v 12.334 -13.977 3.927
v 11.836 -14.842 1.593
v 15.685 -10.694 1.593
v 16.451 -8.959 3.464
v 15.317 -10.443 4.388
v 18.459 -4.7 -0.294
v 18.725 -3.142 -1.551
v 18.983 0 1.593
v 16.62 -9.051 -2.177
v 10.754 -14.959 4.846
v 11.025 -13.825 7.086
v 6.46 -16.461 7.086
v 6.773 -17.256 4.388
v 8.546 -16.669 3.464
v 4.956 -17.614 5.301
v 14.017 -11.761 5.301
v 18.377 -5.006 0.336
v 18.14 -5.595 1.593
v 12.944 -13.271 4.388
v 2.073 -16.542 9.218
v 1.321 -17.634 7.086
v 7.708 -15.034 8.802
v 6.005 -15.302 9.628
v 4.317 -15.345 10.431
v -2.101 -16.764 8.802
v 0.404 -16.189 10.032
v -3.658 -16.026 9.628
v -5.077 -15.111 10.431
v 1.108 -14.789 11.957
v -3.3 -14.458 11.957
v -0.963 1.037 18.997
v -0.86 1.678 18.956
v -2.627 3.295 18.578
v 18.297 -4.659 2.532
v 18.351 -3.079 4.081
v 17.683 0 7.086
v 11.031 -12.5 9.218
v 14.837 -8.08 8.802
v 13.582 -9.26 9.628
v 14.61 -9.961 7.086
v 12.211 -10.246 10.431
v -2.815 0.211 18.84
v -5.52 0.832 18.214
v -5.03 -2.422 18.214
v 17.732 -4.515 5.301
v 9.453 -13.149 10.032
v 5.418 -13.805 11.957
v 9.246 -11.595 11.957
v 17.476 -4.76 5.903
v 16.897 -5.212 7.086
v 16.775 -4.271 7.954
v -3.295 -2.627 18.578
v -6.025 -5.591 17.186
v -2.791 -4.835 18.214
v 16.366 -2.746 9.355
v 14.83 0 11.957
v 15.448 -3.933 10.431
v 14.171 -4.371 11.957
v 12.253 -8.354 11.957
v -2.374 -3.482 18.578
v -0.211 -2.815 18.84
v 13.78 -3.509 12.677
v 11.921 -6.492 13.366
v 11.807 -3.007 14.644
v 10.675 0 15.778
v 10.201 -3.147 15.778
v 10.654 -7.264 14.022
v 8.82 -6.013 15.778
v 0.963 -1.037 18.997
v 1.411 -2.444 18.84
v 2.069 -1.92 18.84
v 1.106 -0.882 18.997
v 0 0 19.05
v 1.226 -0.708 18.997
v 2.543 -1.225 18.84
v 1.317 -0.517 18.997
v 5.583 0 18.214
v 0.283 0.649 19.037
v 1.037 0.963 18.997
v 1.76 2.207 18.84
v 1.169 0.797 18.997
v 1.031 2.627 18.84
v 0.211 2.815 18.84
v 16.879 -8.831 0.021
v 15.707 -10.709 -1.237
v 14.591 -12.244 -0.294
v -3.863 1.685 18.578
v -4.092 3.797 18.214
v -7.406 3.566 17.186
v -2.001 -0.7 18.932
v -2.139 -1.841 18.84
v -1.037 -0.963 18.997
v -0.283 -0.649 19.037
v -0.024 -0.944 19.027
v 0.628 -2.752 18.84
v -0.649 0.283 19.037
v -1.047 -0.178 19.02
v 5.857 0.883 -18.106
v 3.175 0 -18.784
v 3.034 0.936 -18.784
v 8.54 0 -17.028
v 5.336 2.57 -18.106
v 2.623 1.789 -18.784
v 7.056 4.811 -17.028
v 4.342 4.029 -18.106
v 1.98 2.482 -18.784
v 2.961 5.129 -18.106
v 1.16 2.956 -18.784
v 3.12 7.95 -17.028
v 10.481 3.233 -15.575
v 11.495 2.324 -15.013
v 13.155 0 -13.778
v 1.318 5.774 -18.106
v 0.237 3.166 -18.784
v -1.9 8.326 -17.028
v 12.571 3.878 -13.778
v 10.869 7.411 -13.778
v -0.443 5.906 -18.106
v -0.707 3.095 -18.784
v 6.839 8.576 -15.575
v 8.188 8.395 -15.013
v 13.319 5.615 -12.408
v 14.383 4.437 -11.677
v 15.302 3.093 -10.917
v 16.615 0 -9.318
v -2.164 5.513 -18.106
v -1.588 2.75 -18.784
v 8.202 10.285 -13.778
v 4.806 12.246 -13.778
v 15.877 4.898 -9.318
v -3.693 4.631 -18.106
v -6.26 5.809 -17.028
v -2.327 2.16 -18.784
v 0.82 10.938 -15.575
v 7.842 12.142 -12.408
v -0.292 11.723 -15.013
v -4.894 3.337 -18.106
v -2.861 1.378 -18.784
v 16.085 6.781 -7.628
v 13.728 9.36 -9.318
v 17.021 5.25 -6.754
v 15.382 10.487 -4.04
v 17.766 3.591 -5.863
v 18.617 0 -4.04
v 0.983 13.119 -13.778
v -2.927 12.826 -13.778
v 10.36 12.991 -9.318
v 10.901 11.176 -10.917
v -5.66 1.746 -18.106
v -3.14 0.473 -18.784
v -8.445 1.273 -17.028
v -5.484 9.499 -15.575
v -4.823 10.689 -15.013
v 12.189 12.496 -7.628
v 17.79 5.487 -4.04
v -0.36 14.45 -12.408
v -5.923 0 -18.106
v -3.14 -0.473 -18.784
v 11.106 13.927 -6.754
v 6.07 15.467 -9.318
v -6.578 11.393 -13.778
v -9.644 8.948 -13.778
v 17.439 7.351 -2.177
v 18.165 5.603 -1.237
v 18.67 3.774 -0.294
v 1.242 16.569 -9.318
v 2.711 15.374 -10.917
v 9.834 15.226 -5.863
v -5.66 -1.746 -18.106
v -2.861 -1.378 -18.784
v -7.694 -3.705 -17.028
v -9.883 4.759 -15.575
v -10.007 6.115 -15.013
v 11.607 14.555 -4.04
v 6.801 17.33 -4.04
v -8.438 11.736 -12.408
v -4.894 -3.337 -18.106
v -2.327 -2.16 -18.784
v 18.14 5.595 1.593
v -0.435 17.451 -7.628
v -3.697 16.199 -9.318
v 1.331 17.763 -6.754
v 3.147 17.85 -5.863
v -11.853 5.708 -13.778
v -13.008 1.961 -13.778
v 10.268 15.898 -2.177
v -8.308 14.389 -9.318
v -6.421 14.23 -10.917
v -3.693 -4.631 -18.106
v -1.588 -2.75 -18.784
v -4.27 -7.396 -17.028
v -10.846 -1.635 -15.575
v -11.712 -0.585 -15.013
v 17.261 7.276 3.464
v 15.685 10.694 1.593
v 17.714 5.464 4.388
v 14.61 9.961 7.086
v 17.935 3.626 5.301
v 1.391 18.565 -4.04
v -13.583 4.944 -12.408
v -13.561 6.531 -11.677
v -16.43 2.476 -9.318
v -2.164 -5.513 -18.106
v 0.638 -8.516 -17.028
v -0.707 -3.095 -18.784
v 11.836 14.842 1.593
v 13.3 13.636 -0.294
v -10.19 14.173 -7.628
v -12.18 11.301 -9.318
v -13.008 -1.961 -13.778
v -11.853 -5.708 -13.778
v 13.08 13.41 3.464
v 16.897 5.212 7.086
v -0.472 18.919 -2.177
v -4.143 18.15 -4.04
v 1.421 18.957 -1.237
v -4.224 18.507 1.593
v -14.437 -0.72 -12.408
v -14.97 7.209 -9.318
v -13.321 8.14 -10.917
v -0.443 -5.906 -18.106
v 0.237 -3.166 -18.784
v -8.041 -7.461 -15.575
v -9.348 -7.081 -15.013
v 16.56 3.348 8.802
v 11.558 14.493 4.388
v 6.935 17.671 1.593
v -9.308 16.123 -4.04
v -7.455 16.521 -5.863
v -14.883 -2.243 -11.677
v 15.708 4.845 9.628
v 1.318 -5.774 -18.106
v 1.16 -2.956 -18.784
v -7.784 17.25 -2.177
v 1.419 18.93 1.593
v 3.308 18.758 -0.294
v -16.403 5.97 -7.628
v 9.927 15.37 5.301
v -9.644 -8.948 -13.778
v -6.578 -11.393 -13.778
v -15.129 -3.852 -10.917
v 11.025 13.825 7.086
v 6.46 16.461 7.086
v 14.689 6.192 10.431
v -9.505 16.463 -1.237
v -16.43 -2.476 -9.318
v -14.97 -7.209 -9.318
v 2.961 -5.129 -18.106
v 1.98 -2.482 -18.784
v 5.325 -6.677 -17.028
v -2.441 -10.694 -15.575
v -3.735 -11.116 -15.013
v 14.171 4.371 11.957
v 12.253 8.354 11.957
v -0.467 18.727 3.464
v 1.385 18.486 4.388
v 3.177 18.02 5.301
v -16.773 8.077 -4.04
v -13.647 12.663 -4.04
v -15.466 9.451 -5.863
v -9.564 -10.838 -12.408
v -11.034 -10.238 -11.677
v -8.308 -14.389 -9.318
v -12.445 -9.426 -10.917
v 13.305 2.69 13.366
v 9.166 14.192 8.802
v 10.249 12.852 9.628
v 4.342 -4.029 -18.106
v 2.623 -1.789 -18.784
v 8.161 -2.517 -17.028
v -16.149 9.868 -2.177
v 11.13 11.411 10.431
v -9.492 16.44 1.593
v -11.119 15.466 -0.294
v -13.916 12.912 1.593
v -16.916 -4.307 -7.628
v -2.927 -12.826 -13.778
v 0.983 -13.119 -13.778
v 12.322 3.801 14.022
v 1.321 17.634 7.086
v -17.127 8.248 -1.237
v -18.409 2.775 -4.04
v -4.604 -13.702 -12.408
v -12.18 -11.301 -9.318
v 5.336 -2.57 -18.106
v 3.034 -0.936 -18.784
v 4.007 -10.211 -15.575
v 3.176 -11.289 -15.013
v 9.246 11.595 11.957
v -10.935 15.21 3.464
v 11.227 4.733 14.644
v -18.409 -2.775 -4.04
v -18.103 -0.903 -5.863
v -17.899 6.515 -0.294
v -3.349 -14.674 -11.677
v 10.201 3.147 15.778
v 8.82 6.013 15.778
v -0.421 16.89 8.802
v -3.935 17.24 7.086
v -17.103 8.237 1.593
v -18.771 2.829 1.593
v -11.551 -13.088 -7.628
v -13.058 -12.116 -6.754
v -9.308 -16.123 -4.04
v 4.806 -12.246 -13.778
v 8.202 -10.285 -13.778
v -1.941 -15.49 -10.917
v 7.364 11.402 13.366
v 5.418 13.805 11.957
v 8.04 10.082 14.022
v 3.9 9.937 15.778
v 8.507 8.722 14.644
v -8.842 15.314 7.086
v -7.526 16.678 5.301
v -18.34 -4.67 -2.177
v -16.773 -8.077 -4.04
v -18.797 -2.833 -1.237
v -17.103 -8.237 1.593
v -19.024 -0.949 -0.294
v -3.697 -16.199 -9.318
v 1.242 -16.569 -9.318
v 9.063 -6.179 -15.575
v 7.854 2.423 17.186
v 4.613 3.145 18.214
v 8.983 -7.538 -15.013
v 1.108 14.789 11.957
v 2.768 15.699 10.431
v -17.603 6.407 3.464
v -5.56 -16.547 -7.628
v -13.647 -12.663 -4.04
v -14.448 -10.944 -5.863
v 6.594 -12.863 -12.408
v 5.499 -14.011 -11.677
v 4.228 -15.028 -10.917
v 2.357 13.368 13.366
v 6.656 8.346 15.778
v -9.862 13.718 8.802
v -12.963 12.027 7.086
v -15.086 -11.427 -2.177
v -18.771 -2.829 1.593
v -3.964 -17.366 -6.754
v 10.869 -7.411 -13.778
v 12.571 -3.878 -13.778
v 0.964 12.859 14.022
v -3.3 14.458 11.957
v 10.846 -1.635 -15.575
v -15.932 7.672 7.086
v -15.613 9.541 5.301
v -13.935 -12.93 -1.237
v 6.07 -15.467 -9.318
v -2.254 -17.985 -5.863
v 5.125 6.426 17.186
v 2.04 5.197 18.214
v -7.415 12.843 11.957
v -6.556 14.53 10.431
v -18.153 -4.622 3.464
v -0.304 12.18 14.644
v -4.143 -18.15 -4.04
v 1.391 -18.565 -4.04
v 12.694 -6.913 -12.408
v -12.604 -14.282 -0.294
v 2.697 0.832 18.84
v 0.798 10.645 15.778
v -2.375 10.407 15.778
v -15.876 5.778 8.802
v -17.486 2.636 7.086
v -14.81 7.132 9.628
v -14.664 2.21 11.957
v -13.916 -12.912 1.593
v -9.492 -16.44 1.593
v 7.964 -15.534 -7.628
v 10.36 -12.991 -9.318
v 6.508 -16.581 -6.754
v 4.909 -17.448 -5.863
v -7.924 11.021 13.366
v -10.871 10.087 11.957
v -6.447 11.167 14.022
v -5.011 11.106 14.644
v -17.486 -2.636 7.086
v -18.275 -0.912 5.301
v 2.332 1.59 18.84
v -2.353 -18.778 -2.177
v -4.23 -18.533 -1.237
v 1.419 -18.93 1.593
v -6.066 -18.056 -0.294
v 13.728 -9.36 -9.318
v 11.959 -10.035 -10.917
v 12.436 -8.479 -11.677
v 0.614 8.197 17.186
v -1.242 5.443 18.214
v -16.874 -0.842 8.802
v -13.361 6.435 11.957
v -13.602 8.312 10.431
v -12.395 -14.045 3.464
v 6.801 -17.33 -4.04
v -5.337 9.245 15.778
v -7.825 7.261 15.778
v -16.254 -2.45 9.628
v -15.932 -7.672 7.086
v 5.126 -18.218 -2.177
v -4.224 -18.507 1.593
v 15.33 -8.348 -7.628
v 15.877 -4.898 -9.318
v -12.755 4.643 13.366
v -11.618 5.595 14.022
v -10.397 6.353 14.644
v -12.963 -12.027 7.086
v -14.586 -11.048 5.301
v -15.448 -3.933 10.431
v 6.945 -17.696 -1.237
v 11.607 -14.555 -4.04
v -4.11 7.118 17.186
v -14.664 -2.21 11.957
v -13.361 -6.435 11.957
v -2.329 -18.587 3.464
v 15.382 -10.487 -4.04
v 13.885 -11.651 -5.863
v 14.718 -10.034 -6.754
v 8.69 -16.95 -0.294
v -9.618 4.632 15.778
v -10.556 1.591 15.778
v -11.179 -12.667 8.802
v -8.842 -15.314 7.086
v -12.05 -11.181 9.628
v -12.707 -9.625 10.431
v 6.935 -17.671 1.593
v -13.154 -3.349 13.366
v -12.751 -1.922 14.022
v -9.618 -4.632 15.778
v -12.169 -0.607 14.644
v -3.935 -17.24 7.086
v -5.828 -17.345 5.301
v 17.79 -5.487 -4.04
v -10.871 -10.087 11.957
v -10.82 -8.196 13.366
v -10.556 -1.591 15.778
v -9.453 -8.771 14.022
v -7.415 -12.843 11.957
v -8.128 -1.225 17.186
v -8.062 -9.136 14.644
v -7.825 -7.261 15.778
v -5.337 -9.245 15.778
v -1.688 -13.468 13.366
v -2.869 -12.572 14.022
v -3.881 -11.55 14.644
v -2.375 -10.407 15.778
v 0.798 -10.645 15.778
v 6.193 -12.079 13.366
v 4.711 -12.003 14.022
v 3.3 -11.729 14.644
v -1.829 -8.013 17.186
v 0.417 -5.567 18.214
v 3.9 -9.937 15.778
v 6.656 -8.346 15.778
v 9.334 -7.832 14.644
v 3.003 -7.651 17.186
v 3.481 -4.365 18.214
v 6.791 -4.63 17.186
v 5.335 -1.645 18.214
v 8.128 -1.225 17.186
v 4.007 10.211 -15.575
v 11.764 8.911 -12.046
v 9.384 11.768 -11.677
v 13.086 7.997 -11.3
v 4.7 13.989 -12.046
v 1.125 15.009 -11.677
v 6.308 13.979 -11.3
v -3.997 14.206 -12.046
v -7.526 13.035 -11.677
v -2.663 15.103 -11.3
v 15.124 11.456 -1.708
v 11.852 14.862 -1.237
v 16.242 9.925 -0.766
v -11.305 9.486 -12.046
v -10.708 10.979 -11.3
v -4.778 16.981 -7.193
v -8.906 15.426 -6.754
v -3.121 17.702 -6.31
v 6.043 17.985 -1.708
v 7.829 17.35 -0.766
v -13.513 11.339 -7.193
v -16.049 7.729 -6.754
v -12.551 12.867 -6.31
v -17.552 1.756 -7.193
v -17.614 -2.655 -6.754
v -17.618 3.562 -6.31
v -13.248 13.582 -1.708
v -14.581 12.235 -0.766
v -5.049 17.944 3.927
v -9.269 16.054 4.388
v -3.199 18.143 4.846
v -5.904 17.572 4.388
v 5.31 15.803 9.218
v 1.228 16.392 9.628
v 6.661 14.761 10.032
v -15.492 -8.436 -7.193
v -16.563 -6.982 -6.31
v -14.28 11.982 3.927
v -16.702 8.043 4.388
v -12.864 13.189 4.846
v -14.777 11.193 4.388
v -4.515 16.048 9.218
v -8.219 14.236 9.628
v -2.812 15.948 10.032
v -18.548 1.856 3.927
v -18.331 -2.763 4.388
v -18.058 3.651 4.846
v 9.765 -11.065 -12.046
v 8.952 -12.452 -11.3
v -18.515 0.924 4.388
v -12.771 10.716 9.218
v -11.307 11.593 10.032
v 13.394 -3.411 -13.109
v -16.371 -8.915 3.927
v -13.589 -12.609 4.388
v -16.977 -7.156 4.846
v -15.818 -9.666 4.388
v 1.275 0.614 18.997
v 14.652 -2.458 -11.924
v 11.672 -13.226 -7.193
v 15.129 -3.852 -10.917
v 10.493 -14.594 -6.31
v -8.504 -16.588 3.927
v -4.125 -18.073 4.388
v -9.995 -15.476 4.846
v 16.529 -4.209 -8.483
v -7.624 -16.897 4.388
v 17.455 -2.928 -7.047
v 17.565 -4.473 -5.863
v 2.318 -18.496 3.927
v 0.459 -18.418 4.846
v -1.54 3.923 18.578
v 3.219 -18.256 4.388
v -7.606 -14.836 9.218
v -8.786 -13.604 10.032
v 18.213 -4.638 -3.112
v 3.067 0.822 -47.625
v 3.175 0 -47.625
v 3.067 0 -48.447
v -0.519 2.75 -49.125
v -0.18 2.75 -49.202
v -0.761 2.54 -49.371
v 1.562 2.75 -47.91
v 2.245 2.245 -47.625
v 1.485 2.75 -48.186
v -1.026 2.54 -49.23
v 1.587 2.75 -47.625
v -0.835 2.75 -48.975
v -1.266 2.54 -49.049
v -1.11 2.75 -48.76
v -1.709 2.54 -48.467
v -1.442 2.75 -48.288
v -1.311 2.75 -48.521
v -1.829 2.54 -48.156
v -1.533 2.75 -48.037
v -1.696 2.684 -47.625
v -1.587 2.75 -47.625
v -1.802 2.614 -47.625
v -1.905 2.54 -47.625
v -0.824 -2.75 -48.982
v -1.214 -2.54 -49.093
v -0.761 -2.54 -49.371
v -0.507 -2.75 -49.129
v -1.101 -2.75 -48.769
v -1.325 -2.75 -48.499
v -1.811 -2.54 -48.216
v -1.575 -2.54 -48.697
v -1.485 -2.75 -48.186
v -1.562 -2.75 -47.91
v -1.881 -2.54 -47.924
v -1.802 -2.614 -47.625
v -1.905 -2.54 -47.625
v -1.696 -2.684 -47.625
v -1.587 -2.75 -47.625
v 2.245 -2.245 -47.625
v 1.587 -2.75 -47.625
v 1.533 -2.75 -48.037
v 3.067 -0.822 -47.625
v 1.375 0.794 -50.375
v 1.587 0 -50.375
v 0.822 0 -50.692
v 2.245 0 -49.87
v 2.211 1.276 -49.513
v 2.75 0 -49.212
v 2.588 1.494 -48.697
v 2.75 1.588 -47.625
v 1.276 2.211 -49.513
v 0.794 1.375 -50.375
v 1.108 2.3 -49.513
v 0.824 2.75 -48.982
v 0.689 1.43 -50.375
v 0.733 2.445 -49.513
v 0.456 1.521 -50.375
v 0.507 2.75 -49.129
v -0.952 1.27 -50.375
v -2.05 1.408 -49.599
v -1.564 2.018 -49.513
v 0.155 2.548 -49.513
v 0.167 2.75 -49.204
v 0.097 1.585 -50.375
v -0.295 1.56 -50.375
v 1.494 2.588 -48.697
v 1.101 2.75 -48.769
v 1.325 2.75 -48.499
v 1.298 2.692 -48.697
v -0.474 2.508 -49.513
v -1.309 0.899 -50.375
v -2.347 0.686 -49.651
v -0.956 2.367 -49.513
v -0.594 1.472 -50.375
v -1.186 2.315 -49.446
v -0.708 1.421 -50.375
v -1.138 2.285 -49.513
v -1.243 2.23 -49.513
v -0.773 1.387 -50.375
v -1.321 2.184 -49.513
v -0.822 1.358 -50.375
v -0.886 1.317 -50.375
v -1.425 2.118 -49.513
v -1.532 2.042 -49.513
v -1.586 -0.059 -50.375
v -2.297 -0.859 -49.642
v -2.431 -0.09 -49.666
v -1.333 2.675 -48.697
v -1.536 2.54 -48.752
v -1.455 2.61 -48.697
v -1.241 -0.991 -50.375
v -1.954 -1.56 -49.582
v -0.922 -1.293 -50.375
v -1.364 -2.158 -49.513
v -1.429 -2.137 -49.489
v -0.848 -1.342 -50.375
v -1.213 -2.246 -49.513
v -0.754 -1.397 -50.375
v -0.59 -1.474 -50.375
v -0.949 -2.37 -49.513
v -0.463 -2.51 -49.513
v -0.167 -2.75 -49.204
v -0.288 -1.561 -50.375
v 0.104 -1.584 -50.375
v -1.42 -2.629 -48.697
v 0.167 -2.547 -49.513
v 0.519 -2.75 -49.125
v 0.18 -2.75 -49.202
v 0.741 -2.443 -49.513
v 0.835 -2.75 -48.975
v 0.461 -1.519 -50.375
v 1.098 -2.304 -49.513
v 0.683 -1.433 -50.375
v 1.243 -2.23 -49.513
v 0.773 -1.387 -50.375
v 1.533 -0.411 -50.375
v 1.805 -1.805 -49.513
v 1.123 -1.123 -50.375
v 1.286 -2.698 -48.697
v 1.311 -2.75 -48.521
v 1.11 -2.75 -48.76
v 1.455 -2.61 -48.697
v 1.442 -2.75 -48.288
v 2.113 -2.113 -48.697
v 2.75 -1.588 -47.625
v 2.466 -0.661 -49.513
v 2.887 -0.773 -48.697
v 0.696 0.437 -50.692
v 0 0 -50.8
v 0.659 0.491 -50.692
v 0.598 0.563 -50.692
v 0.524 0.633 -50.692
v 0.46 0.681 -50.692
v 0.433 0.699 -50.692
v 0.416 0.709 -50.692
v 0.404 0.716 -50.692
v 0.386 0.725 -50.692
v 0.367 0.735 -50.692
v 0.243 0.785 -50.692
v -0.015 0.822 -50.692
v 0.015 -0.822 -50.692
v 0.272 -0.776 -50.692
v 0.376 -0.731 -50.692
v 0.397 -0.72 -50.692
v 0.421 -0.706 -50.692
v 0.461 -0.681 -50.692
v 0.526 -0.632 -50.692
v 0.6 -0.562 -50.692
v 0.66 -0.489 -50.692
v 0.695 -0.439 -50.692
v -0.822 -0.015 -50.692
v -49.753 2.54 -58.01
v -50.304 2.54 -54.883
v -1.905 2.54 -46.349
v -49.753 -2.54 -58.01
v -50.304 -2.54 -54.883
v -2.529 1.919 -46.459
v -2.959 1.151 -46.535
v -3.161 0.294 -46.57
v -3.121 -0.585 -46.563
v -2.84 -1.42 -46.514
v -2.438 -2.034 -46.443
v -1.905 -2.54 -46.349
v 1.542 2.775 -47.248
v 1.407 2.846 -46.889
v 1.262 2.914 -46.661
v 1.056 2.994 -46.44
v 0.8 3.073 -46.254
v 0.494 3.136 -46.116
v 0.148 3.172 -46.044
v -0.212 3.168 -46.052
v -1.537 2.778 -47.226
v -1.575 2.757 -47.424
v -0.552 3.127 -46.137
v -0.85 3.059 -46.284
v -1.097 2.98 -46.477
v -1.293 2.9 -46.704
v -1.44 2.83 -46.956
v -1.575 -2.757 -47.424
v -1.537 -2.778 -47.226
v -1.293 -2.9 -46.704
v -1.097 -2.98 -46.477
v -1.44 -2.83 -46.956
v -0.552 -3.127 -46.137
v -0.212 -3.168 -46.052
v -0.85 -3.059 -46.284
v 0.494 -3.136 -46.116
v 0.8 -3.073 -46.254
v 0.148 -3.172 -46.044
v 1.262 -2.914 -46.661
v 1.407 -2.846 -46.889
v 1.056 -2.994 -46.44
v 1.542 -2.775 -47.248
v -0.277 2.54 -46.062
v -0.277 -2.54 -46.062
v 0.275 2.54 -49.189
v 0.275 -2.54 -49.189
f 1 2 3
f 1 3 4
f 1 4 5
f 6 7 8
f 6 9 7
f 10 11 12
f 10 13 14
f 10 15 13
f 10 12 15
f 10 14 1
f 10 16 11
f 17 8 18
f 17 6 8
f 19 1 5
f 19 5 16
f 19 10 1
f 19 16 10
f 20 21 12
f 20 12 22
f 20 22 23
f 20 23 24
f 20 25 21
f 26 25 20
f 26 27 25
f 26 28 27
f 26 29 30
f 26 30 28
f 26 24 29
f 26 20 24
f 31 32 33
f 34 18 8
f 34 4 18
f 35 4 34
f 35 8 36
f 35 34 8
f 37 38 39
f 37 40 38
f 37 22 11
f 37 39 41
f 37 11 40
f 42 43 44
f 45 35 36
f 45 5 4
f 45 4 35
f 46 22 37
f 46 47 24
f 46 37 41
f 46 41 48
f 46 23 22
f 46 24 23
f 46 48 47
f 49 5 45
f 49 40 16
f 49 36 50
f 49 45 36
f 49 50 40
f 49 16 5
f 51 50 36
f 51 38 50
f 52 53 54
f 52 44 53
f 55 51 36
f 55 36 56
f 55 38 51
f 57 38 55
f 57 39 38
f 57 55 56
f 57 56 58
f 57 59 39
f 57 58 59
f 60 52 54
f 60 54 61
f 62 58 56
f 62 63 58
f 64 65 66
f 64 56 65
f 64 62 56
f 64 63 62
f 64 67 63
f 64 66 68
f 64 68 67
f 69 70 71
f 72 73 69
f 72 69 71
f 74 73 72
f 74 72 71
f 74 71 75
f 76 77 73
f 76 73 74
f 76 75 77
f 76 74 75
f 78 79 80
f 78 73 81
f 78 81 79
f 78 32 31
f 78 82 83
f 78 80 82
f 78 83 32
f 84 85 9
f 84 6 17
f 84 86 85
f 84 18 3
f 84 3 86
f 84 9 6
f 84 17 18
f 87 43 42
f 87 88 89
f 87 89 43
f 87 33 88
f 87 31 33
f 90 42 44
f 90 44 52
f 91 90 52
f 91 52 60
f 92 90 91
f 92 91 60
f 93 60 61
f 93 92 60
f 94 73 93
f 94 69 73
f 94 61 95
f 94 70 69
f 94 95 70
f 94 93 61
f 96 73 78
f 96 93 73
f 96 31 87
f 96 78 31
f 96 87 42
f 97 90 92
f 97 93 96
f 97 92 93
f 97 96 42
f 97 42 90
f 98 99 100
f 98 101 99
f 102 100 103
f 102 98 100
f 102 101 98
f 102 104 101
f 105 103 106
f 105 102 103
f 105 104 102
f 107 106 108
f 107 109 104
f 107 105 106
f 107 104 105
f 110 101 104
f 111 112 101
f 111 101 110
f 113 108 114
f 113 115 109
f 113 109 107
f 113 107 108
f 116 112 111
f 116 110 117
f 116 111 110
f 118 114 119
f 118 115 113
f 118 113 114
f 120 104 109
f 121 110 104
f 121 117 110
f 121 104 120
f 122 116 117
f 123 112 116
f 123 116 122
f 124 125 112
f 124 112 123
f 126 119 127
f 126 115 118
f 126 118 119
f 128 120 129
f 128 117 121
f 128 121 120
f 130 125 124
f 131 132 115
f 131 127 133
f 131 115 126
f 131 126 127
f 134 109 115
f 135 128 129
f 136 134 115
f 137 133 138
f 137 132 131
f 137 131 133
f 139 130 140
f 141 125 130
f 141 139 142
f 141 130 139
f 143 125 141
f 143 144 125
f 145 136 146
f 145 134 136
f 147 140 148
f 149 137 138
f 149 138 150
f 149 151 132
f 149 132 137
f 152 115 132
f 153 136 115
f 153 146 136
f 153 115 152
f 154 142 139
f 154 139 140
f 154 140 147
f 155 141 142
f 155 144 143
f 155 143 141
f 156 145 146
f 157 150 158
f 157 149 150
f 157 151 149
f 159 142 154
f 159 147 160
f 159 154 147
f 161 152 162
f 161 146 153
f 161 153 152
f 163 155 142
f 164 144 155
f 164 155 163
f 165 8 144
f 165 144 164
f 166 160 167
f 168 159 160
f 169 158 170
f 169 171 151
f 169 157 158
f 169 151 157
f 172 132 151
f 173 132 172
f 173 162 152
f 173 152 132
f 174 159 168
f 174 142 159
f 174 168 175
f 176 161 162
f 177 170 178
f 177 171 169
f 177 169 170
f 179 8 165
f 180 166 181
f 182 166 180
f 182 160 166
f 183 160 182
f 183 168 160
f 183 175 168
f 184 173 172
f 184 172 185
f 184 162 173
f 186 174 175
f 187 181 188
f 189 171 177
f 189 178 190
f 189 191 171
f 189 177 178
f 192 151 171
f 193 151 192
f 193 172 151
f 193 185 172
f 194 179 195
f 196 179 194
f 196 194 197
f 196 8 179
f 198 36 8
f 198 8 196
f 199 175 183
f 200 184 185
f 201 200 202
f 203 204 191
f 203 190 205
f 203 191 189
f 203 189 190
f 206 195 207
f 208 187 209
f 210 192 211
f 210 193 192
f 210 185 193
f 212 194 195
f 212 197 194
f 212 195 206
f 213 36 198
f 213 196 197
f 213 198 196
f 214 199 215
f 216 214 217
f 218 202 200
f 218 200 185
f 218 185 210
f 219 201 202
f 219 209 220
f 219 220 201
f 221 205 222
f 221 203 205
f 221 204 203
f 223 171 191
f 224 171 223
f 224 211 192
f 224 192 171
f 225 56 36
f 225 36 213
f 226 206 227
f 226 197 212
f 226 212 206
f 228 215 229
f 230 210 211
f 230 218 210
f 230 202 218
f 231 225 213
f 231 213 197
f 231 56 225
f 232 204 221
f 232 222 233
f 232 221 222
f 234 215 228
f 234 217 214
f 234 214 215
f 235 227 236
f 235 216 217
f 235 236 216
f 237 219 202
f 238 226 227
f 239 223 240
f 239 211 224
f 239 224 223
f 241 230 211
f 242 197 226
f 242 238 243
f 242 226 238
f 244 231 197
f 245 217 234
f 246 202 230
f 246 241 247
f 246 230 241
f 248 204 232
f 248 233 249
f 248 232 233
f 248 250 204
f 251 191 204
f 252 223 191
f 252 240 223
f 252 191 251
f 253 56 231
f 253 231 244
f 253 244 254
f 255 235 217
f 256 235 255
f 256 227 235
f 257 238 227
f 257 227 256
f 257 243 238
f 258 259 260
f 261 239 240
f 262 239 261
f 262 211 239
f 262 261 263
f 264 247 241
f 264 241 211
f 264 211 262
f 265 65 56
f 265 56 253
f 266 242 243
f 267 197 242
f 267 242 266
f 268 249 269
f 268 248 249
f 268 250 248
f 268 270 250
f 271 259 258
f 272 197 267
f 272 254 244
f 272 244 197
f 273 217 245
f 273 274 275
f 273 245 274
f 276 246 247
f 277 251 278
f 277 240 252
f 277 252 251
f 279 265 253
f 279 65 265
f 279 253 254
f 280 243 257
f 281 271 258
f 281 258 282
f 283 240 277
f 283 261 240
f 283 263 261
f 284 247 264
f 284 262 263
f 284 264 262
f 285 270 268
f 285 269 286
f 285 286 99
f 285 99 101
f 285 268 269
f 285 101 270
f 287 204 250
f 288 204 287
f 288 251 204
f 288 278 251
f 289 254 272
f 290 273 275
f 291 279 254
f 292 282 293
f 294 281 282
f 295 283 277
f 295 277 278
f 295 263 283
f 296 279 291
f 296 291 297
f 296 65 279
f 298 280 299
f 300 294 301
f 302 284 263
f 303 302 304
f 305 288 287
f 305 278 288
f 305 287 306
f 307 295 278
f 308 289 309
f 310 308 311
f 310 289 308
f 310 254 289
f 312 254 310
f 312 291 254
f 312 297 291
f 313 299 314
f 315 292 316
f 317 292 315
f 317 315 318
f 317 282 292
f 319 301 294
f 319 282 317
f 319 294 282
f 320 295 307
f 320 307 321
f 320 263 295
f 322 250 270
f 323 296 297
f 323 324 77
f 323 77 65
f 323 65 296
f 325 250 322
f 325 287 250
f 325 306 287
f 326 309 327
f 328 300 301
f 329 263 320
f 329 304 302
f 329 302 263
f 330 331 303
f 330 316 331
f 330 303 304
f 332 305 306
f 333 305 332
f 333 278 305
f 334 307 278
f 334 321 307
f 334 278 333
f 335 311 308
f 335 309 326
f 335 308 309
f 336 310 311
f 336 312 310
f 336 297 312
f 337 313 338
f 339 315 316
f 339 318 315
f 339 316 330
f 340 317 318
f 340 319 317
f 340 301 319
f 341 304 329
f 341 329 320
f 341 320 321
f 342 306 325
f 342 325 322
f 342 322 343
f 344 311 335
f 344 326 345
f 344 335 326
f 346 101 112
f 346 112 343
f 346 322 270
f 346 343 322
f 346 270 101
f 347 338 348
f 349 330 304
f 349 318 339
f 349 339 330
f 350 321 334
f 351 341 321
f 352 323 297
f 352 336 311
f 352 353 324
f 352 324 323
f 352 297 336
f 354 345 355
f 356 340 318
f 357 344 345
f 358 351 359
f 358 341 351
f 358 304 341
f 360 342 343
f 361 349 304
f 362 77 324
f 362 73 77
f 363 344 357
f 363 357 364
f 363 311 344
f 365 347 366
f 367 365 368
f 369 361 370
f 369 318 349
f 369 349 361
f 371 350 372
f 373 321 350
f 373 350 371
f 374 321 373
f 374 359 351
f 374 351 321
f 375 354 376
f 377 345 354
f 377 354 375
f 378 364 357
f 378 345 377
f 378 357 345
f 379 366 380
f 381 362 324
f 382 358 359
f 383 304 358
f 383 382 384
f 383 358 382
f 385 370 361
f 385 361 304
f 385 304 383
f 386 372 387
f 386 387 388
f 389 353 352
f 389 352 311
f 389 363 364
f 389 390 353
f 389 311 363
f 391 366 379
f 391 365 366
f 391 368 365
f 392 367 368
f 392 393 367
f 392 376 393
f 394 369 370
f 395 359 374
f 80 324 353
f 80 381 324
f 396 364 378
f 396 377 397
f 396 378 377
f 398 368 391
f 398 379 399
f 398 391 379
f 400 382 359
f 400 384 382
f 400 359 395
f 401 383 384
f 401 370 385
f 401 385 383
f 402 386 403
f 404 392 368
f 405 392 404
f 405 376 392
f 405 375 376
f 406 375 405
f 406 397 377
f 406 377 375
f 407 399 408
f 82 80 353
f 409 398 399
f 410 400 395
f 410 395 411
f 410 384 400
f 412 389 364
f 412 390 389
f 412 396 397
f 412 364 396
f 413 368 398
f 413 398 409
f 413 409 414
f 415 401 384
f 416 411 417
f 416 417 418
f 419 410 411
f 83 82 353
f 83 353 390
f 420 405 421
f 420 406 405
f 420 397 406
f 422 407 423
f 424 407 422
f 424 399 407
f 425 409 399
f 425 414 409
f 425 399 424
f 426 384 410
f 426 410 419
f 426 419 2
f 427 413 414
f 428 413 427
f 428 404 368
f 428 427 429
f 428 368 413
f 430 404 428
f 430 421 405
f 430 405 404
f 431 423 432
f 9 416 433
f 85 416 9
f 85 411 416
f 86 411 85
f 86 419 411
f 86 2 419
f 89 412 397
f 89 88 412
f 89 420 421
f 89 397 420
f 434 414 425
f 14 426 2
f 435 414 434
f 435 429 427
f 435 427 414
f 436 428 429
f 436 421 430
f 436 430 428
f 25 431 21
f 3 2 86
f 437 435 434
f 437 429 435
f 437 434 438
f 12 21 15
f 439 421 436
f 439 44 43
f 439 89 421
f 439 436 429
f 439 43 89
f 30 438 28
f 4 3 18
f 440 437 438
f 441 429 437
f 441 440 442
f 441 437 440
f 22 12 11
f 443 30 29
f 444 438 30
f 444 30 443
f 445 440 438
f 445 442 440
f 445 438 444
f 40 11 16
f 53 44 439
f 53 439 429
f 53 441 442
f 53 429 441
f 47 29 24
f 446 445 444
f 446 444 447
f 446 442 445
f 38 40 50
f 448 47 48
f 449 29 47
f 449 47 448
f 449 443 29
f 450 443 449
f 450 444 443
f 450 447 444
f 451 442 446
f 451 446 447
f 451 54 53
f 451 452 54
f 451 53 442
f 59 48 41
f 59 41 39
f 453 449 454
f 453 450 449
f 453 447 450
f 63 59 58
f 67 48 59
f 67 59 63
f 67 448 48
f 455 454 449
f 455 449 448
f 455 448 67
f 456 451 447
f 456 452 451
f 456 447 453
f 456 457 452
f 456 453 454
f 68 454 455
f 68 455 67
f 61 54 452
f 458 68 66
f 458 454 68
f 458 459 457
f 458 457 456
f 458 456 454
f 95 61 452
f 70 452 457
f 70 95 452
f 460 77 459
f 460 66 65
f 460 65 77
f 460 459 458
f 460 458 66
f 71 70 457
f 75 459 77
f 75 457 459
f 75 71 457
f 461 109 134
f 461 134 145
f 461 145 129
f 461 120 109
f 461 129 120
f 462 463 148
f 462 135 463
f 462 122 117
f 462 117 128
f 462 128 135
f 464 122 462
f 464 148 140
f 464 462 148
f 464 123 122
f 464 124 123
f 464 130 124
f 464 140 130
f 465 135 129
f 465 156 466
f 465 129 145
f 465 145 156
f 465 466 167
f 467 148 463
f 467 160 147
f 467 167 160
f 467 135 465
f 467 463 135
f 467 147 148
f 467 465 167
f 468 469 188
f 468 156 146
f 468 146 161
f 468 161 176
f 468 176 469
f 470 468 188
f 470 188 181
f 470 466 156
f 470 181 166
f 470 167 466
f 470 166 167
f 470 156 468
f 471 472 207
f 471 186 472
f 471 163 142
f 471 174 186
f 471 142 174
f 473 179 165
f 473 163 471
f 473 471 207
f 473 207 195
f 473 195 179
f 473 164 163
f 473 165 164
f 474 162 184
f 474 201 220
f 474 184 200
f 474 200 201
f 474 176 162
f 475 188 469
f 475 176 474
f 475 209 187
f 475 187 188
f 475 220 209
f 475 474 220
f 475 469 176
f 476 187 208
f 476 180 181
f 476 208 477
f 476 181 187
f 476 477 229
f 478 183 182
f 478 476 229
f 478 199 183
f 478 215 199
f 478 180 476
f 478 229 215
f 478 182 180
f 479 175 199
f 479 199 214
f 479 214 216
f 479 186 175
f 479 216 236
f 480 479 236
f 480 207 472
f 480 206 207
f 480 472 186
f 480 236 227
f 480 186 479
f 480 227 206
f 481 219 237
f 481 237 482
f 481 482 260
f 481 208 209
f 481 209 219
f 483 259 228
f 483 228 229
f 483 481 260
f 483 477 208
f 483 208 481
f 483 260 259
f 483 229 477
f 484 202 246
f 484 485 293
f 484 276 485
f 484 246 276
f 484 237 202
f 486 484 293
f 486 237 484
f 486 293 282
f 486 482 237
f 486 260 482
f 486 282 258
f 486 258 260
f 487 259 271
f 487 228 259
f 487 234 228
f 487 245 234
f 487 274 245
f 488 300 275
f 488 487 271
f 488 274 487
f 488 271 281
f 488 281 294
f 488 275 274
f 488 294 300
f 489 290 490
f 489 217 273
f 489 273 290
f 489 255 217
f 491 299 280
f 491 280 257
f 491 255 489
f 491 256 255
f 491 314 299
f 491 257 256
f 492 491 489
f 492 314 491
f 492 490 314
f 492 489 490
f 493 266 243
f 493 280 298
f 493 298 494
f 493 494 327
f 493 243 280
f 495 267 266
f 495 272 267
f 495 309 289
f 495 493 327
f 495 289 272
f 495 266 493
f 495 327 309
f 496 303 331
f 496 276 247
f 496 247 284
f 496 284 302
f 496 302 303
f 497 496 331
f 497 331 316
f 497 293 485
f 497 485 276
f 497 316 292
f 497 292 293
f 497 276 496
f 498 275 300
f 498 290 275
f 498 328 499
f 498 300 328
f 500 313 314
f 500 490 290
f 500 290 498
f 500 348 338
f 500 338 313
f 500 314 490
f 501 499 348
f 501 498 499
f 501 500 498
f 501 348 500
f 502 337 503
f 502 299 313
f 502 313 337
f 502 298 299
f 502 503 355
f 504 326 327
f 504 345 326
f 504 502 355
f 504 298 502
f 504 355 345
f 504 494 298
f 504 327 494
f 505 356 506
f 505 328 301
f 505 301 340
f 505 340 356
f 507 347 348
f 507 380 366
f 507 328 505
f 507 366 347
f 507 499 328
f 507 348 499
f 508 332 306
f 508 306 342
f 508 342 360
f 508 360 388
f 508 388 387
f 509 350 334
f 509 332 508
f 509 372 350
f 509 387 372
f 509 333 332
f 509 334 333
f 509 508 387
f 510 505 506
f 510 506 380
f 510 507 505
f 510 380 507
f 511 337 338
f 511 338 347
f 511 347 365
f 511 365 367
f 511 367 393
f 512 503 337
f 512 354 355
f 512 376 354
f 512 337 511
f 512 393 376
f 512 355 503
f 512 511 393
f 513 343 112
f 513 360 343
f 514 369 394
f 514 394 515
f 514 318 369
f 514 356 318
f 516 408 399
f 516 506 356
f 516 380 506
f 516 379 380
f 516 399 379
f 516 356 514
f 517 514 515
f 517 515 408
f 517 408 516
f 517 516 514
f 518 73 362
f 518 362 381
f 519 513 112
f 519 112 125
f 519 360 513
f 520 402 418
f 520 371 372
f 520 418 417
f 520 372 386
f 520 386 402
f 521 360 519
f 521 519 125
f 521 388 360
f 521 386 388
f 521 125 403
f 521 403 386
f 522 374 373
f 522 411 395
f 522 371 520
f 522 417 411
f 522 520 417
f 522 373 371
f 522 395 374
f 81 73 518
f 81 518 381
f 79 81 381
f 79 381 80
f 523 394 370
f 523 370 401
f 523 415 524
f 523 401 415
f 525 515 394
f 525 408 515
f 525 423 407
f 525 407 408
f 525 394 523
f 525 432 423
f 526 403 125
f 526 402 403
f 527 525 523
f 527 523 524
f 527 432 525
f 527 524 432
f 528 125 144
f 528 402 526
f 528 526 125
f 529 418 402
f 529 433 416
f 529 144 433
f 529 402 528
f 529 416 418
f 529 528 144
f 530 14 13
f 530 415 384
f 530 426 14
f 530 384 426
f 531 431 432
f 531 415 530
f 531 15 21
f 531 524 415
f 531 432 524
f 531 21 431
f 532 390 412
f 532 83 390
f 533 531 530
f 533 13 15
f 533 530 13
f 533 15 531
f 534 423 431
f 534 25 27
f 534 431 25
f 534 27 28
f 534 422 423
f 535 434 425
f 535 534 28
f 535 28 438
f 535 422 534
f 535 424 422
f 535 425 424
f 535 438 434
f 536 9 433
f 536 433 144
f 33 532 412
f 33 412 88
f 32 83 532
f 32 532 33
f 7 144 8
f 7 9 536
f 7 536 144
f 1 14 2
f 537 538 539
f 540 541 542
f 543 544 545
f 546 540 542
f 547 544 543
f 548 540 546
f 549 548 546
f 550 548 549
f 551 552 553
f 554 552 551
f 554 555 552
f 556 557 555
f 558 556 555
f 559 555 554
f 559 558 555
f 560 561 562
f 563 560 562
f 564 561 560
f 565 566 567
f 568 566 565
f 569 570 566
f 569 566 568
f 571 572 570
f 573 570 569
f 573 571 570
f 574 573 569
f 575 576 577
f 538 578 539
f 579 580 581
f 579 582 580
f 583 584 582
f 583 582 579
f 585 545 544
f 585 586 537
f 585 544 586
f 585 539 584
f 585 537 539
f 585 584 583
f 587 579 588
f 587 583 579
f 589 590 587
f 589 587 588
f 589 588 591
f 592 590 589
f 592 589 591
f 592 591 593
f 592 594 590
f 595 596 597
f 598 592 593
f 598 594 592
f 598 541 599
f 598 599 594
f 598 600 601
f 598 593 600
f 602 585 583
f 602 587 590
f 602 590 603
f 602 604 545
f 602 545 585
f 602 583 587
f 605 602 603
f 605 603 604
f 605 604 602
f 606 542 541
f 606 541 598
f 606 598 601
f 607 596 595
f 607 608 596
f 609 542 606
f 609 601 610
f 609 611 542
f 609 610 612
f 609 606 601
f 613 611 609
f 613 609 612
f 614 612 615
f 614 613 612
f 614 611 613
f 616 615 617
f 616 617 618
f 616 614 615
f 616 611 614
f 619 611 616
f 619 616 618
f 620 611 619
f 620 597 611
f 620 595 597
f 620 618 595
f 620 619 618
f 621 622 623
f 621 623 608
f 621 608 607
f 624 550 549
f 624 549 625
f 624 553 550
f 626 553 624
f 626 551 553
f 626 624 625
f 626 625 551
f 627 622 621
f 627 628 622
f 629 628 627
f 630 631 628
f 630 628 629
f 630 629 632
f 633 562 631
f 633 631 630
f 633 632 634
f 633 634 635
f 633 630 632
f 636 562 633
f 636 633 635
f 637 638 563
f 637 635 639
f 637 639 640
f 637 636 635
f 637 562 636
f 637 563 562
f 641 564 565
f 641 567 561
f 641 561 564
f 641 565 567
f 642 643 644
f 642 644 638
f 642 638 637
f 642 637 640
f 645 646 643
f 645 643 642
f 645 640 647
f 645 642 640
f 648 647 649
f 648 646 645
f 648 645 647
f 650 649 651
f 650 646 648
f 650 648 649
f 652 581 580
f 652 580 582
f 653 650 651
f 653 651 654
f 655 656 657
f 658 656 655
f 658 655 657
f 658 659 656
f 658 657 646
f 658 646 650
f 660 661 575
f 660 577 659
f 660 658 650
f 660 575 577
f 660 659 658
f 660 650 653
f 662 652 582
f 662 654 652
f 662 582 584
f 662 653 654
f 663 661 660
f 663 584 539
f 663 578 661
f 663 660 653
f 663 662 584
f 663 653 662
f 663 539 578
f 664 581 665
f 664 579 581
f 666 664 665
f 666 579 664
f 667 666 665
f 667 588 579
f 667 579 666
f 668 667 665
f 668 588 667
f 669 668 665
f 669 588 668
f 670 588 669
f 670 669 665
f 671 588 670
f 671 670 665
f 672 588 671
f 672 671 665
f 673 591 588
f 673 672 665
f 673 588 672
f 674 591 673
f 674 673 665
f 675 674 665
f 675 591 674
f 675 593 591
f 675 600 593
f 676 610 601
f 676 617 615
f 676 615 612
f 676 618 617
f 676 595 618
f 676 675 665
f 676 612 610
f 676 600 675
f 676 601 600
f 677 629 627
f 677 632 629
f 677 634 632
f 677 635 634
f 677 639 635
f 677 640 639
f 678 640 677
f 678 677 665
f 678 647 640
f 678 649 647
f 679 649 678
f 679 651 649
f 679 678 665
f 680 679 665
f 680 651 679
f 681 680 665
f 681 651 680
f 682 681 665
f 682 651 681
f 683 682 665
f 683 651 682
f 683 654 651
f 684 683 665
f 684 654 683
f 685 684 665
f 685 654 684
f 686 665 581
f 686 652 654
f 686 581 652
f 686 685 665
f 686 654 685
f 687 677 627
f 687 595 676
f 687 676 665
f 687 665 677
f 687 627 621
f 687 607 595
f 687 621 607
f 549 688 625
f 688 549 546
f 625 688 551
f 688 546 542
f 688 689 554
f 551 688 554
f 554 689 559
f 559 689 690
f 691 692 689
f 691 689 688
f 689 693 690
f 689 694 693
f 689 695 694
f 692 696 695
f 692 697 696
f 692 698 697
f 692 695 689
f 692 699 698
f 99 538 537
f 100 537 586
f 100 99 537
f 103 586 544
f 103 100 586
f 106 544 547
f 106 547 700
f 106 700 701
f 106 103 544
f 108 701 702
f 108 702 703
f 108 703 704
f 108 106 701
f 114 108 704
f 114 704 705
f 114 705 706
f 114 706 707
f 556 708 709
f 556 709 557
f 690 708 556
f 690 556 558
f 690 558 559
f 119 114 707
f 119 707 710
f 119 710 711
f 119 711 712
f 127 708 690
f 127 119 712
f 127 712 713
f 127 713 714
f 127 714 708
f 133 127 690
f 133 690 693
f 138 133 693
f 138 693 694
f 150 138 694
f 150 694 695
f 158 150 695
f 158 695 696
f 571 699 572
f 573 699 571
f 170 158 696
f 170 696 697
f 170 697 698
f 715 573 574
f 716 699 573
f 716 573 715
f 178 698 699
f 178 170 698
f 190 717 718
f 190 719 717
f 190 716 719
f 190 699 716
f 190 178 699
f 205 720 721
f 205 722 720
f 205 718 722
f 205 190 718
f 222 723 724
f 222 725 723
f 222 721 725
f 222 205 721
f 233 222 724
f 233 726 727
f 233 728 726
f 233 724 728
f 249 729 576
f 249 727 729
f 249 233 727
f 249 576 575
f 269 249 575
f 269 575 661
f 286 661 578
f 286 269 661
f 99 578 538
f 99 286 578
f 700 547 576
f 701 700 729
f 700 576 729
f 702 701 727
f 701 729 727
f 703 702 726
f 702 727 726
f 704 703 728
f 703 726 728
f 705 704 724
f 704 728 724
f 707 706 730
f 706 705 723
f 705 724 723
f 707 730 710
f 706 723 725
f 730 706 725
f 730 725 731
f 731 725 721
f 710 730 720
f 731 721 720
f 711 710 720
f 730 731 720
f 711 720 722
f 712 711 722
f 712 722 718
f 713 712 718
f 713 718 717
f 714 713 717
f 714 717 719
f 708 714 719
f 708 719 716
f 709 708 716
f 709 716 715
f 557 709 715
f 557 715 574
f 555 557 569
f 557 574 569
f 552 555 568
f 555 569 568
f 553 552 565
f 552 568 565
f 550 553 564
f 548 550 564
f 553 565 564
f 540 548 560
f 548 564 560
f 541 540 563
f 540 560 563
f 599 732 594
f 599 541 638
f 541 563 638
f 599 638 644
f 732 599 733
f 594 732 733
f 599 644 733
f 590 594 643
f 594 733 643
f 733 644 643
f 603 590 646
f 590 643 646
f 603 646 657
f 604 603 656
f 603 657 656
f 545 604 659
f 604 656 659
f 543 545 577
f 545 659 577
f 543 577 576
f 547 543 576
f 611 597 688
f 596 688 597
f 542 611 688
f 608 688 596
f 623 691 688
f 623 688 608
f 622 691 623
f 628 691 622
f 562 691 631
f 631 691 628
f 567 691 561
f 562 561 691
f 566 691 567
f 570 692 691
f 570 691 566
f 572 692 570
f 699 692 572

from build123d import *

# Parameters (mm, degrees)
F2_R     = 1.5875
F3_DEPTH = 12.7
F5_DEPTH = 2.54


with BuildPart() as f1:
    # F0 (on Front) → F1 (revolve)
    with BuildSketch(Plane.XZ):
        with BuildLine():
            Line((0, 19.05), (0, 0))
            Line((0, 0), (0, -50.8))
            ThreePointArc((0, -50.8), (2.245064, -49.870064), (3.175, -47.625))
            Line((3.175, -47.625), (3.175, -18.783553))
            ThreePointArc((3.175, -18.783553), (18.983271, 1.59308), (0, 19.05))
        make_face()
    revolve(axis=Axis((0, 0, 41.657603), (0, 0, 1)))

    # F2 (on Front) → F3 (cut, symmetric)
    with BuildSketch(Plane.XZ):
        with Locations((0, -47.625)):
            Circle(F2_R)
    extrude(amount=F3_DEPTH, both=True, mode=Mode.SUBTRACT)

    # F4 (on Front) → F5 (join, symmetric)
    with BuildSketch(Plane.XZ):
        with BuildLine():
            ThreePointArc((-1.5875, -47.625), (-1.216096, -46.604575), (-0.275666, -46.061618))
            Line((-0.275666, -46.061618), (-50.3039, -54.882945))
            Line((-50.3039, -54.882945), (-49.752567, -58.00971))
            Line((-49.752567, -58.00971), (0.275666, -49.188382))
            ThreePointArc((0.275666, -49.188382), (-1.020425, -48.841096), (-1.5875, -47.625))
        make_face()
    extrude(amount=F5_DEPTH, both=True)


solid = f1.part
